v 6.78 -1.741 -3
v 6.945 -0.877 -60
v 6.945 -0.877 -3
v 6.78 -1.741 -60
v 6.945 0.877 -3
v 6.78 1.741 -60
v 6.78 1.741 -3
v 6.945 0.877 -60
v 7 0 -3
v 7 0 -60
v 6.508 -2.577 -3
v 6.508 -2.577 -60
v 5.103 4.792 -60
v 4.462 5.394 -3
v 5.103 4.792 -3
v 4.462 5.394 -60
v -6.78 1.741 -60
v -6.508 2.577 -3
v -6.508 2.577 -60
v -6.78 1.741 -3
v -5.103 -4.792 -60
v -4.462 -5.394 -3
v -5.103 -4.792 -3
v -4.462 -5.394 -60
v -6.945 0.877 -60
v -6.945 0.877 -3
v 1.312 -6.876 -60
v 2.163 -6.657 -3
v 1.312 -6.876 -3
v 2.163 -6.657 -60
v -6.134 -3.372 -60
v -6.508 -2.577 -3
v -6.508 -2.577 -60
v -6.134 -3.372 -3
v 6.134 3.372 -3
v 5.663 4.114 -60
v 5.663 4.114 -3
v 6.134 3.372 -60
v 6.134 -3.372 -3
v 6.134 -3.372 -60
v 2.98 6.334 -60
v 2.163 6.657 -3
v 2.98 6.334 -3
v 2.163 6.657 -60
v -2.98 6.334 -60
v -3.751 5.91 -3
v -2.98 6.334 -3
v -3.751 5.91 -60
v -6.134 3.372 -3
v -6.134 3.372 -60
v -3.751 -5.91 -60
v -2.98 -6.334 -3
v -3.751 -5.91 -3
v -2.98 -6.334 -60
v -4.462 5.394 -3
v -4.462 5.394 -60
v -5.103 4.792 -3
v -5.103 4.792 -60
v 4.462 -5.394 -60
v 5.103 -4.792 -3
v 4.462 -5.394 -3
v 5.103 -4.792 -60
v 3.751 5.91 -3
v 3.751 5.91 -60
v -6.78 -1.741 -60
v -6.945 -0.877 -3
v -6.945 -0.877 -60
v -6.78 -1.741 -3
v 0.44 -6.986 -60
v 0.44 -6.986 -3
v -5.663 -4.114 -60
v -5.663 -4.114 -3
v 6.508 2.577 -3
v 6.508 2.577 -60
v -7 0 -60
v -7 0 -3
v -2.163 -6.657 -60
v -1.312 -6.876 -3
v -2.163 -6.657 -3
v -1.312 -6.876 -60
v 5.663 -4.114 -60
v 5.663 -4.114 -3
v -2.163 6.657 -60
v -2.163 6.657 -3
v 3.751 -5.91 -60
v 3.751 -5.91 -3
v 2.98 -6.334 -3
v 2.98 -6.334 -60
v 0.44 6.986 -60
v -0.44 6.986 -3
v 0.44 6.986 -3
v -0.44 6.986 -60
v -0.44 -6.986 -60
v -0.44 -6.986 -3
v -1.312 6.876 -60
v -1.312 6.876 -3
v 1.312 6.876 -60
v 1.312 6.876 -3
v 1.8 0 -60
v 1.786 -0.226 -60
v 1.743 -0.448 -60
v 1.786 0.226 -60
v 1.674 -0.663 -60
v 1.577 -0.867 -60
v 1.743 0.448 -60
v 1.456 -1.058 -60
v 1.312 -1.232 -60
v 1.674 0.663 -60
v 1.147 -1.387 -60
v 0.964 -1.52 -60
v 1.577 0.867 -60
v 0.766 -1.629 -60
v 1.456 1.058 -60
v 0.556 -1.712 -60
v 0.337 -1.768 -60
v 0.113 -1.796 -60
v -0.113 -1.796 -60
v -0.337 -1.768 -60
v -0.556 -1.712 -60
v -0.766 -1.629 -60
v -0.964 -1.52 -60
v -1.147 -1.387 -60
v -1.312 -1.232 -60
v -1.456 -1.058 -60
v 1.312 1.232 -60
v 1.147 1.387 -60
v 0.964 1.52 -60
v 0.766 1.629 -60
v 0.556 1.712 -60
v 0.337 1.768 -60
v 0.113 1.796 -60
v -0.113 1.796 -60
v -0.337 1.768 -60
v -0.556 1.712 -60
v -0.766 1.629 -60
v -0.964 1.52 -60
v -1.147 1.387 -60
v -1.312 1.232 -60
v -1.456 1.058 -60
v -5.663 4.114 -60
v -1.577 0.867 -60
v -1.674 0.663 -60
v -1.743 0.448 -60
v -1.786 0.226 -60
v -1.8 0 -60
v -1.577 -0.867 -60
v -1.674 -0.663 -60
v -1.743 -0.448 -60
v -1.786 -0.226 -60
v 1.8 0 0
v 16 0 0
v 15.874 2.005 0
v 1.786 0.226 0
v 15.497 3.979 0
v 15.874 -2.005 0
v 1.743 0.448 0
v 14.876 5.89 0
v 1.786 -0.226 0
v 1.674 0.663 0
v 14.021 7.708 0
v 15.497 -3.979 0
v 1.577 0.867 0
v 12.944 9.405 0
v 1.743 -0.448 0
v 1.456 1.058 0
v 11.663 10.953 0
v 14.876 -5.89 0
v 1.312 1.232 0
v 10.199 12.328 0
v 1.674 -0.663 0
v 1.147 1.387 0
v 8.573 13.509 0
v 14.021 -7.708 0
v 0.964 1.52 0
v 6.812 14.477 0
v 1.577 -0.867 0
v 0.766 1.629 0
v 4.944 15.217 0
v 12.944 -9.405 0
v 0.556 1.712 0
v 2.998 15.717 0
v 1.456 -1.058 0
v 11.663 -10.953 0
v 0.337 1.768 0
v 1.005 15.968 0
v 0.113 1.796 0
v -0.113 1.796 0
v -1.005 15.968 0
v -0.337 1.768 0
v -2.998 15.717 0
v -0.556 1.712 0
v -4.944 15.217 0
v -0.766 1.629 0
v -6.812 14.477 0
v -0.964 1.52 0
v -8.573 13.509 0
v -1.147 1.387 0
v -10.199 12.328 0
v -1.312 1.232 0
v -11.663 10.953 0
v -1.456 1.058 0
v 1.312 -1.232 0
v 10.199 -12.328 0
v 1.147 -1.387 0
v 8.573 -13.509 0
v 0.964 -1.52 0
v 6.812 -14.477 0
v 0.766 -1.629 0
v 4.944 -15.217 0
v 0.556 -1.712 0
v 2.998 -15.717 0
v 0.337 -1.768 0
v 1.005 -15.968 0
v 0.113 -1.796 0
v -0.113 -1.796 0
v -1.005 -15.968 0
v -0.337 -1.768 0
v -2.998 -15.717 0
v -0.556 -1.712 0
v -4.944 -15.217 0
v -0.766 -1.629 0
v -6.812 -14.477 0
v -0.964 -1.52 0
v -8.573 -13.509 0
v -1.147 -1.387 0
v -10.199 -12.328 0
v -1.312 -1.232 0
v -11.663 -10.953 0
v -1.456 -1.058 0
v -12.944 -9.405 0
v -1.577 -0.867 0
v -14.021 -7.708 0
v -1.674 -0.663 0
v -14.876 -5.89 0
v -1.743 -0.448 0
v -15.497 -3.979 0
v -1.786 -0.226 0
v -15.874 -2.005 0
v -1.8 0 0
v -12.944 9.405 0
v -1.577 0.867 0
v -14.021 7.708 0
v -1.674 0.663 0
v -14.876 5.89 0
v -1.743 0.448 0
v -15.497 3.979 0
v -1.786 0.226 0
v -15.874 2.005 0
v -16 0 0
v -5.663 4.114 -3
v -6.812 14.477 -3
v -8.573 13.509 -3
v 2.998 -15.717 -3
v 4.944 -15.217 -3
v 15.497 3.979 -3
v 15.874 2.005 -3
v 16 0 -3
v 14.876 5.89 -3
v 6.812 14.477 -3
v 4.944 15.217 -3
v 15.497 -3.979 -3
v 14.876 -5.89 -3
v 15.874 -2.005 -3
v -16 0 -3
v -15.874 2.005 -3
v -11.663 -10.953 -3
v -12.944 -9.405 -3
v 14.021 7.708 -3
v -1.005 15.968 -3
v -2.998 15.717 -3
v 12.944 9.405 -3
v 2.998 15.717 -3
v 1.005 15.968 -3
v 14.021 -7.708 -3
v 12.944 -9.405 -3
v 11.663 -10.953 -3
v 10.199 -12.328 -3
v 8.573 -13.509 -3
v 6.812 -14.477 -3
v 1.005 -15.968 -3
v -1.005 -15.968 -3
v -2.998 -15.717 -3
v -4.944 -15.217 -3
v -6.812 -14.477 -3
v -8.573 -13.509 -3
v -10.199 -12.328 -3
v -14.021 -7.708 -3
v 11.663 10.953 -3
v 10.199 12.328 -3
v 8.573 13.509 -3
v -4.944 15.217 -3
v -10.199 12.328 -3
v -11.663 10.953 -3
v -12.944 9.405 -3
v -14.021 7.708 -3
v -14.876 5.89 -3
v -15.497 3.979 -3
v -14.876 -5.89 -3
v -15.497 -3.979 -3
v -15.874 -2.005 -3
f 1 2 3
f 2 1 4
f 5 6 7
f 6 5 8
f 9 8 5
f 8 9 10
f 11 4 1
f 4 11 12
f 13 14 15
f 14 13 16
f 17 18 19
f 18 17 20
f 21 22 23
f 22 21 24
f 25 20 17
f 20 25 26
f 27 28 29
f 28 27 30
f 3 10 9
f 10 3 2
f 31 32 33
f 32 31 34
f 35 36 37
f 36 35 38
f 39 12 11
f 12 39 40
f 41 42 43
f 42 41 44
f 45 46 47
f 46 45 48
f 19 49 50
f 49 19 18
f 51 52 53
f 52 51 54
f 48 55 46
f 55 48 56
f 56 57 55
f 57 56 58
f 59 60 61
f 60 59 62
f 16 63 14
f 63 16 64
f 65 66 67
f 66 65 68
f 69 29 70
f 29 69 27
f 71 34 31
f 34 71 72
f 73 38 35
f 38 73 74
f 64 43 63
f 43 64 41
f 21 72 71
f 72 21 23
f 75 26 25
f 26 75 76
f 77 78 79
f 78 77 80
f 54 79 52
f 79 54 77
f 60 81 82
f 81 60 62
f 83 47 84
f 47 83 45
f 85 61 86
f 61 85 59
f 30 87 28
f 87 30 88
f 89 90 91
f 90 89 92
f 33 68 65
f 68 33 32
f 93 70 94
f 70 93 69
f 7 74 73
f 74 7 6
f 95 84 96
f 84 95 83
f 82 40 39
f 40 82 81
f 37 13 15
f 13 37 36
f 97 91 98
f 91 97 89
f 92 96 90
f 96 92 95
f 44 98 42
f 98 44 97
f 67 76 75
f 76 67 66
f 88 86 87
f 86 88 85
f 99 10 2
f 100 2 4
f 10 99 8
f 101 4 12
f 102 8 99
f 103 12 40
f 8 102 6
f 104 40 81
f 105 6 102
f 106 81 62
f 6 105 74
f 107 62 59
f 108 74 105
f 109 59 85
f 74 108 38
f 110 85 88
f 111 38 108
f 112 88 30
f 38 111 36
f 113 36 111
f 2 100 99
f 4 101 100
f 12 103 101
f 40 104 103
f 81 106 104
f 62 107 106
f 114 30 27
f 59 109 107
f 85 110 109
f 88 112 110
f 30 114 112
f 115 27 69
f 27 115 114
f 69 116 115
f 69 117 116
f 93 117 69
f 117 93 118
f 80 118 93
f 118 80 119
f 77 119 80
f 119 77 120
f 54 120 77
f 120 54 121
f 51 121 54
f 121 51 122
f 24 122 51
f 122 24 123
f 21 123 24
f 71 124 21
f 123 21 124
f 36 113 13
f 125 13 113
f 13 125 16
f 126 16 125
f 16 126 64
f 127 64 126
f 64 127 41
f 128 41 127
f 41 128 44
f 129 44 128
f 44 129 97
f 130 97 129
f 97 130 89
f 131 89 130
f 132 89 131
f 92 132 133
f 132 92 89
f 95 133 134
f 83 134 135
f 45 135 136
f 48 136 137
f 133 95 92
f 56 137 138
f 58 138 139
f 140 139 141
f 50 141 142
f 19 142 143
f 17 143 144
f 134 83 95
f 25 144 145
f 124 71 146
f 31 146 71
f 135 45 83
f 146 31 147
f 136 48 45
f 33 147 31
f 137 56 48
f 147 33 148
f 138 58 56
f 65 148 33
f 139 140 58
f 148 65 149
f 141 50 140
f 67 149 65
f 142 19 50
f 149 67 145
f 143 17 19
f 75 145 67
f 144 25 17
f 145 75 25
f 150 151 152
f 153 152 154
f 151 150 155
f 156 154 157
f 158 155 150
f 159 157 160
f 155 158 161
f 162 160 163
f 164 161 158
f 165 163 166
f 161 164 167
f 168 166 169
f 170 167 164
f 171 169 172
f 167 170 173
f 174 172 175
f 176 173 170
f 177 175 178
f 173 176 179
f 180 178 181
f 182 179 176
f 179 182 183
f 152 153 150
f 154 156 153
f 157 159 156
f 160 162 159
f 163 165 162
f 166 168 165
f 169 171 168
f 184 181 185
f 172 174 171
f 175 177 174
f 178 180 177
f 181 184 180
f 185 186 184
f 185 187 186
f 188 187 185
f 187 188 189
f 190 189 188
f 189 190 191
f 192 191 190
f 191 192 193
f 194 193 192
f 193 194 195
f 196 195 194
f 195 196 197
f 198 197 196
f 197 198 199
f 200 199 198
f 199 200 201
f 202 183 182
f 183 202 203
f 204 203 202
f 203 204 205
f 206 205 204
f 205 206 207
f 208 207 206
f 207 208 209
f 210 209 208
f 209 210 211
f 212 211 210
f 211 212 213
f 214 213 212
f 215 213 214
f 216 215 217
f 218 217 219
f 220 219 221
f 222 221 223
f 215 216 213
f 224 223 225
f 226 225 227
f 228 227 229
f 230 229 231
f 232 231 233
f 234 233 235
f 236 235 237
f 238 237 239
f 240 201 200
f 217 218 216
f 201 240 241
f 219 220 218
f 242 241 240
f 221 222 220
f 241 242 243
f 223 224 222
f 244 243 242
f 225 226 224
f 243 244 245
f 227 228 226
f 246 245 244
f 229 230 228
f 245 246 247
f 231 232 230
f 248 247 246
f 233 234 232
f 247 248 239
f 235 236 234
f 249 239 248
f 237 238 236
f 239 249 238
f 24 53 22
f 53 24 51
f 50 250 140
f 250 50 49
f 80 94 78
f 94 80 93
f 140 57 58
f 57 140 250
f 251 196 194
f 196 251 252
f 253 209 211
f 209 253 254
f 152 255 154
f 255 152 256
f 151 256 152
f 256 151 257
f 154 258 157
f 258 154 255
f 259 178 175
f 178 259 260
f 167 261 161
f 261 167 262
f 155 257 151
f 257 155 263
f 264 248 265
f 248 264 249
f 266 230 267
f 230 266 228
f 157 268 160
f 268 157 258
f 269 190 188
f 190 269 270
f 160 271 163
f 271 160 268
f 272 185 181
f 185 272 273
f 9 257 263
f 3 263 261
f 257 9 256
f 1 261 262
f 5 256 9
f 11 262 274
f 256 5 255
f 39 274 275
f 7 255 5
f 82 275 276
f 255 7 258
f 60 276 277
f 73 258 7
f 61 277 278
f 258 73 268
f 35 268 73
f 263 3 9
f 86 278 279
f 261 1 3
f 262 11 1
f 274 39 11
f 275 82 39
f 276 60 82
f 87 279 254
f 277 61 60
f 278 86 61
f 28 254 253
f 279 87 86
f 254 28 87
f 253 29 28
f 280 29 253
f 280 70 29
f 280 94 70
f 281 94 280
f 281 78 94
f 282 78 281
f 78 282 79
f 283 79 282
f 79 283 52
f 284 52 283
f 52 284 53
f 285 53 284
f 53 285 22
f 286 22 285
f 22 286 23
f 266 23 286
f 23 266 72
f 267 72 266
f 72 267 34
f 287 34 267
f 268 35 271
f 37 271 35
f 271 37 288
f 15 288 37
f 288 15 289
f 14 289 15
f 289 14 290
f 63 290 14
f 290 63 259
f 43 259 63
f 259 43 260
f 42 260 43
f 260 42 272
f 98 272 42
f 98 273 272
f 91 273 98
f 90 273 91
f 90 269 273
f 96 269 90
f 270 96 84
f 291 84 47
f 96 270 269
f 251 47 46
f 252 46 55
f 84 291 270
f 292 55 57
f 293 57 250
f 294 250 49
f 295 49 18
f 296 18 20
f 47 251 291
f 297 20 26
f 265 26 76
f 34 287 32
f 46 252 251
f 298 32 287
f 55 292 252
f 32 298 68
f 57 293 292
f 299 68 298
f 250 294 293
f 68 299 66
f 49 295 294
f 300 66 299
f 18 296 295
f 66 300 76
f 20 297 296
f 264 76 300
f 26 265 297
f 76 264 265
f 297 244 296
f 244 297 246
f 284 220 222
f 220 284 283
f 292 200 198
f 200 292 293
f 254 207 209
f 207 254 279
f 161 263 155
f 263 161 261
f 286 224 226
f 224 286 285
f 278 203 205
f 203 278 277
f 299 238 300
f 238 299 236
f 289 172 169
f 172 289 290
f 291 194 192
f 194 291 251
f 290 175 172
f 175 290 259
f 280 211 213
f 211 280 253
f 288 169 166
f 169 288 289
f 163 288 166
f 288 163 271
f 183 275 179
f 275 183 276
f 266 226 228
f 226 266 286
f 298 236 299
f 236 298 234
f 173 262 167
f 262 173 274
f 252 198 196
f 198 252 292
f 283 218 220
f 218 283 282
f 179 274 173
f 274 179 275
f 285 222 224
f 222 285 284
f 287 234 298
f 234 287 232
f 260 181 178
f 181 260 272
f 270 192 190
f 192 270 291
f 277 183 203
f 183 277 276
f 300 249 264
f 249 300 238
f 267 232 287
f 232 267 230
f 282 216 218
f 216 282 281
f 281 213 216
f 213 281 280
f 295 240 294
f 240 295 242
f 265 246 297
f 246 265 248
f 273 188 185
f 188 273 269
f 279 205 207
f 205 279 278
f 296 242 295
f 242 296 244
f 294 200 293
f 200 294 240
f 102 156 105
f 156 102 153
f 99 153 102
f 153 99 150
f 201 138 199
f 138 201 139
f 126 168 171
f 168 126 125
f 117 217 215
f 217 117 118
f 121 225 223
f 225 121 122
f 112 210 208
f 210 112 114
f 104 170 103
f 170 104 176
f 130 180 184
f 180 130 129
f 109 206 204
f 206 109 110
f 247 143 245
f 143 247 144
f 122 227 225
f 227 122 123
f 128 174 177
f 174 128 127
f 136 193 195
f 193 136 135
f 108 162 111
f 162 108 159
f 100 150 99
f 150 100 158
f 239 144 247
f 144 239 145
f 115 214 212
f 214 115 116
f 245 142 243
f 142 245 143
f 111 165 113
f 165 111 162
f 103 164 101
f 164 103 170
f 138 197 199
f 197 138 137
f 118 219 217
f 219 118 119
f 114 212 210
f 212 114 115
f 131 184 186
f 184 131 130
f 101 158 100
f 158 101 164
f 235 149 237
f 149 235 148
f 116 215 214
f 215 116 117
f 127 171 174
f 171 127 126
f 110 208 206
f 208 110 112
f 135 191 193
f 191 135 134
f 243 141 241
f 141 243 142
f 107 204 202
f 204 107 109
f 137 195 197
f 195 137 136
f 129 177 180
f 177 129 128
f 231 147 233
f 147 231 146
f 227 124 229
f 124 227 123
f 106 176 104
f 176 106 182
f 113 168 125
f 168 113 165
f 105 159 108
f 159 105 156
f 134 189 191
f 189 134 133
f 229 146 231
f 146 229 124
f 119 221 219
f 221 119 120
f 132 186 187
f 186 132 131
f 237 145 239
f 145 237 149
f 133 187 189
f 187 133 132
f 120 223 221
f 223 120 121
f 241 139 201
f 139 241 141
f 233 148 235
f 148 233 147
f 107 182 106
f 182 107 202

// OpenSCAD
$fn = 50;


difference() {
	union() {
		translate(v = [0, 0, -60.0000000000]) {
			cylinder(h = 60, r = 7.0000000000);
		}
		translate(v = [0, 0, -3.0000000000]) {
			cylinder(h = 3, r = 16.0000000000);
		}
	}
	union() {
		#translate(v = [0, 0, -60]) {
			cylinder(h = 60, r = 1.8000000000);
		}
	}
}
